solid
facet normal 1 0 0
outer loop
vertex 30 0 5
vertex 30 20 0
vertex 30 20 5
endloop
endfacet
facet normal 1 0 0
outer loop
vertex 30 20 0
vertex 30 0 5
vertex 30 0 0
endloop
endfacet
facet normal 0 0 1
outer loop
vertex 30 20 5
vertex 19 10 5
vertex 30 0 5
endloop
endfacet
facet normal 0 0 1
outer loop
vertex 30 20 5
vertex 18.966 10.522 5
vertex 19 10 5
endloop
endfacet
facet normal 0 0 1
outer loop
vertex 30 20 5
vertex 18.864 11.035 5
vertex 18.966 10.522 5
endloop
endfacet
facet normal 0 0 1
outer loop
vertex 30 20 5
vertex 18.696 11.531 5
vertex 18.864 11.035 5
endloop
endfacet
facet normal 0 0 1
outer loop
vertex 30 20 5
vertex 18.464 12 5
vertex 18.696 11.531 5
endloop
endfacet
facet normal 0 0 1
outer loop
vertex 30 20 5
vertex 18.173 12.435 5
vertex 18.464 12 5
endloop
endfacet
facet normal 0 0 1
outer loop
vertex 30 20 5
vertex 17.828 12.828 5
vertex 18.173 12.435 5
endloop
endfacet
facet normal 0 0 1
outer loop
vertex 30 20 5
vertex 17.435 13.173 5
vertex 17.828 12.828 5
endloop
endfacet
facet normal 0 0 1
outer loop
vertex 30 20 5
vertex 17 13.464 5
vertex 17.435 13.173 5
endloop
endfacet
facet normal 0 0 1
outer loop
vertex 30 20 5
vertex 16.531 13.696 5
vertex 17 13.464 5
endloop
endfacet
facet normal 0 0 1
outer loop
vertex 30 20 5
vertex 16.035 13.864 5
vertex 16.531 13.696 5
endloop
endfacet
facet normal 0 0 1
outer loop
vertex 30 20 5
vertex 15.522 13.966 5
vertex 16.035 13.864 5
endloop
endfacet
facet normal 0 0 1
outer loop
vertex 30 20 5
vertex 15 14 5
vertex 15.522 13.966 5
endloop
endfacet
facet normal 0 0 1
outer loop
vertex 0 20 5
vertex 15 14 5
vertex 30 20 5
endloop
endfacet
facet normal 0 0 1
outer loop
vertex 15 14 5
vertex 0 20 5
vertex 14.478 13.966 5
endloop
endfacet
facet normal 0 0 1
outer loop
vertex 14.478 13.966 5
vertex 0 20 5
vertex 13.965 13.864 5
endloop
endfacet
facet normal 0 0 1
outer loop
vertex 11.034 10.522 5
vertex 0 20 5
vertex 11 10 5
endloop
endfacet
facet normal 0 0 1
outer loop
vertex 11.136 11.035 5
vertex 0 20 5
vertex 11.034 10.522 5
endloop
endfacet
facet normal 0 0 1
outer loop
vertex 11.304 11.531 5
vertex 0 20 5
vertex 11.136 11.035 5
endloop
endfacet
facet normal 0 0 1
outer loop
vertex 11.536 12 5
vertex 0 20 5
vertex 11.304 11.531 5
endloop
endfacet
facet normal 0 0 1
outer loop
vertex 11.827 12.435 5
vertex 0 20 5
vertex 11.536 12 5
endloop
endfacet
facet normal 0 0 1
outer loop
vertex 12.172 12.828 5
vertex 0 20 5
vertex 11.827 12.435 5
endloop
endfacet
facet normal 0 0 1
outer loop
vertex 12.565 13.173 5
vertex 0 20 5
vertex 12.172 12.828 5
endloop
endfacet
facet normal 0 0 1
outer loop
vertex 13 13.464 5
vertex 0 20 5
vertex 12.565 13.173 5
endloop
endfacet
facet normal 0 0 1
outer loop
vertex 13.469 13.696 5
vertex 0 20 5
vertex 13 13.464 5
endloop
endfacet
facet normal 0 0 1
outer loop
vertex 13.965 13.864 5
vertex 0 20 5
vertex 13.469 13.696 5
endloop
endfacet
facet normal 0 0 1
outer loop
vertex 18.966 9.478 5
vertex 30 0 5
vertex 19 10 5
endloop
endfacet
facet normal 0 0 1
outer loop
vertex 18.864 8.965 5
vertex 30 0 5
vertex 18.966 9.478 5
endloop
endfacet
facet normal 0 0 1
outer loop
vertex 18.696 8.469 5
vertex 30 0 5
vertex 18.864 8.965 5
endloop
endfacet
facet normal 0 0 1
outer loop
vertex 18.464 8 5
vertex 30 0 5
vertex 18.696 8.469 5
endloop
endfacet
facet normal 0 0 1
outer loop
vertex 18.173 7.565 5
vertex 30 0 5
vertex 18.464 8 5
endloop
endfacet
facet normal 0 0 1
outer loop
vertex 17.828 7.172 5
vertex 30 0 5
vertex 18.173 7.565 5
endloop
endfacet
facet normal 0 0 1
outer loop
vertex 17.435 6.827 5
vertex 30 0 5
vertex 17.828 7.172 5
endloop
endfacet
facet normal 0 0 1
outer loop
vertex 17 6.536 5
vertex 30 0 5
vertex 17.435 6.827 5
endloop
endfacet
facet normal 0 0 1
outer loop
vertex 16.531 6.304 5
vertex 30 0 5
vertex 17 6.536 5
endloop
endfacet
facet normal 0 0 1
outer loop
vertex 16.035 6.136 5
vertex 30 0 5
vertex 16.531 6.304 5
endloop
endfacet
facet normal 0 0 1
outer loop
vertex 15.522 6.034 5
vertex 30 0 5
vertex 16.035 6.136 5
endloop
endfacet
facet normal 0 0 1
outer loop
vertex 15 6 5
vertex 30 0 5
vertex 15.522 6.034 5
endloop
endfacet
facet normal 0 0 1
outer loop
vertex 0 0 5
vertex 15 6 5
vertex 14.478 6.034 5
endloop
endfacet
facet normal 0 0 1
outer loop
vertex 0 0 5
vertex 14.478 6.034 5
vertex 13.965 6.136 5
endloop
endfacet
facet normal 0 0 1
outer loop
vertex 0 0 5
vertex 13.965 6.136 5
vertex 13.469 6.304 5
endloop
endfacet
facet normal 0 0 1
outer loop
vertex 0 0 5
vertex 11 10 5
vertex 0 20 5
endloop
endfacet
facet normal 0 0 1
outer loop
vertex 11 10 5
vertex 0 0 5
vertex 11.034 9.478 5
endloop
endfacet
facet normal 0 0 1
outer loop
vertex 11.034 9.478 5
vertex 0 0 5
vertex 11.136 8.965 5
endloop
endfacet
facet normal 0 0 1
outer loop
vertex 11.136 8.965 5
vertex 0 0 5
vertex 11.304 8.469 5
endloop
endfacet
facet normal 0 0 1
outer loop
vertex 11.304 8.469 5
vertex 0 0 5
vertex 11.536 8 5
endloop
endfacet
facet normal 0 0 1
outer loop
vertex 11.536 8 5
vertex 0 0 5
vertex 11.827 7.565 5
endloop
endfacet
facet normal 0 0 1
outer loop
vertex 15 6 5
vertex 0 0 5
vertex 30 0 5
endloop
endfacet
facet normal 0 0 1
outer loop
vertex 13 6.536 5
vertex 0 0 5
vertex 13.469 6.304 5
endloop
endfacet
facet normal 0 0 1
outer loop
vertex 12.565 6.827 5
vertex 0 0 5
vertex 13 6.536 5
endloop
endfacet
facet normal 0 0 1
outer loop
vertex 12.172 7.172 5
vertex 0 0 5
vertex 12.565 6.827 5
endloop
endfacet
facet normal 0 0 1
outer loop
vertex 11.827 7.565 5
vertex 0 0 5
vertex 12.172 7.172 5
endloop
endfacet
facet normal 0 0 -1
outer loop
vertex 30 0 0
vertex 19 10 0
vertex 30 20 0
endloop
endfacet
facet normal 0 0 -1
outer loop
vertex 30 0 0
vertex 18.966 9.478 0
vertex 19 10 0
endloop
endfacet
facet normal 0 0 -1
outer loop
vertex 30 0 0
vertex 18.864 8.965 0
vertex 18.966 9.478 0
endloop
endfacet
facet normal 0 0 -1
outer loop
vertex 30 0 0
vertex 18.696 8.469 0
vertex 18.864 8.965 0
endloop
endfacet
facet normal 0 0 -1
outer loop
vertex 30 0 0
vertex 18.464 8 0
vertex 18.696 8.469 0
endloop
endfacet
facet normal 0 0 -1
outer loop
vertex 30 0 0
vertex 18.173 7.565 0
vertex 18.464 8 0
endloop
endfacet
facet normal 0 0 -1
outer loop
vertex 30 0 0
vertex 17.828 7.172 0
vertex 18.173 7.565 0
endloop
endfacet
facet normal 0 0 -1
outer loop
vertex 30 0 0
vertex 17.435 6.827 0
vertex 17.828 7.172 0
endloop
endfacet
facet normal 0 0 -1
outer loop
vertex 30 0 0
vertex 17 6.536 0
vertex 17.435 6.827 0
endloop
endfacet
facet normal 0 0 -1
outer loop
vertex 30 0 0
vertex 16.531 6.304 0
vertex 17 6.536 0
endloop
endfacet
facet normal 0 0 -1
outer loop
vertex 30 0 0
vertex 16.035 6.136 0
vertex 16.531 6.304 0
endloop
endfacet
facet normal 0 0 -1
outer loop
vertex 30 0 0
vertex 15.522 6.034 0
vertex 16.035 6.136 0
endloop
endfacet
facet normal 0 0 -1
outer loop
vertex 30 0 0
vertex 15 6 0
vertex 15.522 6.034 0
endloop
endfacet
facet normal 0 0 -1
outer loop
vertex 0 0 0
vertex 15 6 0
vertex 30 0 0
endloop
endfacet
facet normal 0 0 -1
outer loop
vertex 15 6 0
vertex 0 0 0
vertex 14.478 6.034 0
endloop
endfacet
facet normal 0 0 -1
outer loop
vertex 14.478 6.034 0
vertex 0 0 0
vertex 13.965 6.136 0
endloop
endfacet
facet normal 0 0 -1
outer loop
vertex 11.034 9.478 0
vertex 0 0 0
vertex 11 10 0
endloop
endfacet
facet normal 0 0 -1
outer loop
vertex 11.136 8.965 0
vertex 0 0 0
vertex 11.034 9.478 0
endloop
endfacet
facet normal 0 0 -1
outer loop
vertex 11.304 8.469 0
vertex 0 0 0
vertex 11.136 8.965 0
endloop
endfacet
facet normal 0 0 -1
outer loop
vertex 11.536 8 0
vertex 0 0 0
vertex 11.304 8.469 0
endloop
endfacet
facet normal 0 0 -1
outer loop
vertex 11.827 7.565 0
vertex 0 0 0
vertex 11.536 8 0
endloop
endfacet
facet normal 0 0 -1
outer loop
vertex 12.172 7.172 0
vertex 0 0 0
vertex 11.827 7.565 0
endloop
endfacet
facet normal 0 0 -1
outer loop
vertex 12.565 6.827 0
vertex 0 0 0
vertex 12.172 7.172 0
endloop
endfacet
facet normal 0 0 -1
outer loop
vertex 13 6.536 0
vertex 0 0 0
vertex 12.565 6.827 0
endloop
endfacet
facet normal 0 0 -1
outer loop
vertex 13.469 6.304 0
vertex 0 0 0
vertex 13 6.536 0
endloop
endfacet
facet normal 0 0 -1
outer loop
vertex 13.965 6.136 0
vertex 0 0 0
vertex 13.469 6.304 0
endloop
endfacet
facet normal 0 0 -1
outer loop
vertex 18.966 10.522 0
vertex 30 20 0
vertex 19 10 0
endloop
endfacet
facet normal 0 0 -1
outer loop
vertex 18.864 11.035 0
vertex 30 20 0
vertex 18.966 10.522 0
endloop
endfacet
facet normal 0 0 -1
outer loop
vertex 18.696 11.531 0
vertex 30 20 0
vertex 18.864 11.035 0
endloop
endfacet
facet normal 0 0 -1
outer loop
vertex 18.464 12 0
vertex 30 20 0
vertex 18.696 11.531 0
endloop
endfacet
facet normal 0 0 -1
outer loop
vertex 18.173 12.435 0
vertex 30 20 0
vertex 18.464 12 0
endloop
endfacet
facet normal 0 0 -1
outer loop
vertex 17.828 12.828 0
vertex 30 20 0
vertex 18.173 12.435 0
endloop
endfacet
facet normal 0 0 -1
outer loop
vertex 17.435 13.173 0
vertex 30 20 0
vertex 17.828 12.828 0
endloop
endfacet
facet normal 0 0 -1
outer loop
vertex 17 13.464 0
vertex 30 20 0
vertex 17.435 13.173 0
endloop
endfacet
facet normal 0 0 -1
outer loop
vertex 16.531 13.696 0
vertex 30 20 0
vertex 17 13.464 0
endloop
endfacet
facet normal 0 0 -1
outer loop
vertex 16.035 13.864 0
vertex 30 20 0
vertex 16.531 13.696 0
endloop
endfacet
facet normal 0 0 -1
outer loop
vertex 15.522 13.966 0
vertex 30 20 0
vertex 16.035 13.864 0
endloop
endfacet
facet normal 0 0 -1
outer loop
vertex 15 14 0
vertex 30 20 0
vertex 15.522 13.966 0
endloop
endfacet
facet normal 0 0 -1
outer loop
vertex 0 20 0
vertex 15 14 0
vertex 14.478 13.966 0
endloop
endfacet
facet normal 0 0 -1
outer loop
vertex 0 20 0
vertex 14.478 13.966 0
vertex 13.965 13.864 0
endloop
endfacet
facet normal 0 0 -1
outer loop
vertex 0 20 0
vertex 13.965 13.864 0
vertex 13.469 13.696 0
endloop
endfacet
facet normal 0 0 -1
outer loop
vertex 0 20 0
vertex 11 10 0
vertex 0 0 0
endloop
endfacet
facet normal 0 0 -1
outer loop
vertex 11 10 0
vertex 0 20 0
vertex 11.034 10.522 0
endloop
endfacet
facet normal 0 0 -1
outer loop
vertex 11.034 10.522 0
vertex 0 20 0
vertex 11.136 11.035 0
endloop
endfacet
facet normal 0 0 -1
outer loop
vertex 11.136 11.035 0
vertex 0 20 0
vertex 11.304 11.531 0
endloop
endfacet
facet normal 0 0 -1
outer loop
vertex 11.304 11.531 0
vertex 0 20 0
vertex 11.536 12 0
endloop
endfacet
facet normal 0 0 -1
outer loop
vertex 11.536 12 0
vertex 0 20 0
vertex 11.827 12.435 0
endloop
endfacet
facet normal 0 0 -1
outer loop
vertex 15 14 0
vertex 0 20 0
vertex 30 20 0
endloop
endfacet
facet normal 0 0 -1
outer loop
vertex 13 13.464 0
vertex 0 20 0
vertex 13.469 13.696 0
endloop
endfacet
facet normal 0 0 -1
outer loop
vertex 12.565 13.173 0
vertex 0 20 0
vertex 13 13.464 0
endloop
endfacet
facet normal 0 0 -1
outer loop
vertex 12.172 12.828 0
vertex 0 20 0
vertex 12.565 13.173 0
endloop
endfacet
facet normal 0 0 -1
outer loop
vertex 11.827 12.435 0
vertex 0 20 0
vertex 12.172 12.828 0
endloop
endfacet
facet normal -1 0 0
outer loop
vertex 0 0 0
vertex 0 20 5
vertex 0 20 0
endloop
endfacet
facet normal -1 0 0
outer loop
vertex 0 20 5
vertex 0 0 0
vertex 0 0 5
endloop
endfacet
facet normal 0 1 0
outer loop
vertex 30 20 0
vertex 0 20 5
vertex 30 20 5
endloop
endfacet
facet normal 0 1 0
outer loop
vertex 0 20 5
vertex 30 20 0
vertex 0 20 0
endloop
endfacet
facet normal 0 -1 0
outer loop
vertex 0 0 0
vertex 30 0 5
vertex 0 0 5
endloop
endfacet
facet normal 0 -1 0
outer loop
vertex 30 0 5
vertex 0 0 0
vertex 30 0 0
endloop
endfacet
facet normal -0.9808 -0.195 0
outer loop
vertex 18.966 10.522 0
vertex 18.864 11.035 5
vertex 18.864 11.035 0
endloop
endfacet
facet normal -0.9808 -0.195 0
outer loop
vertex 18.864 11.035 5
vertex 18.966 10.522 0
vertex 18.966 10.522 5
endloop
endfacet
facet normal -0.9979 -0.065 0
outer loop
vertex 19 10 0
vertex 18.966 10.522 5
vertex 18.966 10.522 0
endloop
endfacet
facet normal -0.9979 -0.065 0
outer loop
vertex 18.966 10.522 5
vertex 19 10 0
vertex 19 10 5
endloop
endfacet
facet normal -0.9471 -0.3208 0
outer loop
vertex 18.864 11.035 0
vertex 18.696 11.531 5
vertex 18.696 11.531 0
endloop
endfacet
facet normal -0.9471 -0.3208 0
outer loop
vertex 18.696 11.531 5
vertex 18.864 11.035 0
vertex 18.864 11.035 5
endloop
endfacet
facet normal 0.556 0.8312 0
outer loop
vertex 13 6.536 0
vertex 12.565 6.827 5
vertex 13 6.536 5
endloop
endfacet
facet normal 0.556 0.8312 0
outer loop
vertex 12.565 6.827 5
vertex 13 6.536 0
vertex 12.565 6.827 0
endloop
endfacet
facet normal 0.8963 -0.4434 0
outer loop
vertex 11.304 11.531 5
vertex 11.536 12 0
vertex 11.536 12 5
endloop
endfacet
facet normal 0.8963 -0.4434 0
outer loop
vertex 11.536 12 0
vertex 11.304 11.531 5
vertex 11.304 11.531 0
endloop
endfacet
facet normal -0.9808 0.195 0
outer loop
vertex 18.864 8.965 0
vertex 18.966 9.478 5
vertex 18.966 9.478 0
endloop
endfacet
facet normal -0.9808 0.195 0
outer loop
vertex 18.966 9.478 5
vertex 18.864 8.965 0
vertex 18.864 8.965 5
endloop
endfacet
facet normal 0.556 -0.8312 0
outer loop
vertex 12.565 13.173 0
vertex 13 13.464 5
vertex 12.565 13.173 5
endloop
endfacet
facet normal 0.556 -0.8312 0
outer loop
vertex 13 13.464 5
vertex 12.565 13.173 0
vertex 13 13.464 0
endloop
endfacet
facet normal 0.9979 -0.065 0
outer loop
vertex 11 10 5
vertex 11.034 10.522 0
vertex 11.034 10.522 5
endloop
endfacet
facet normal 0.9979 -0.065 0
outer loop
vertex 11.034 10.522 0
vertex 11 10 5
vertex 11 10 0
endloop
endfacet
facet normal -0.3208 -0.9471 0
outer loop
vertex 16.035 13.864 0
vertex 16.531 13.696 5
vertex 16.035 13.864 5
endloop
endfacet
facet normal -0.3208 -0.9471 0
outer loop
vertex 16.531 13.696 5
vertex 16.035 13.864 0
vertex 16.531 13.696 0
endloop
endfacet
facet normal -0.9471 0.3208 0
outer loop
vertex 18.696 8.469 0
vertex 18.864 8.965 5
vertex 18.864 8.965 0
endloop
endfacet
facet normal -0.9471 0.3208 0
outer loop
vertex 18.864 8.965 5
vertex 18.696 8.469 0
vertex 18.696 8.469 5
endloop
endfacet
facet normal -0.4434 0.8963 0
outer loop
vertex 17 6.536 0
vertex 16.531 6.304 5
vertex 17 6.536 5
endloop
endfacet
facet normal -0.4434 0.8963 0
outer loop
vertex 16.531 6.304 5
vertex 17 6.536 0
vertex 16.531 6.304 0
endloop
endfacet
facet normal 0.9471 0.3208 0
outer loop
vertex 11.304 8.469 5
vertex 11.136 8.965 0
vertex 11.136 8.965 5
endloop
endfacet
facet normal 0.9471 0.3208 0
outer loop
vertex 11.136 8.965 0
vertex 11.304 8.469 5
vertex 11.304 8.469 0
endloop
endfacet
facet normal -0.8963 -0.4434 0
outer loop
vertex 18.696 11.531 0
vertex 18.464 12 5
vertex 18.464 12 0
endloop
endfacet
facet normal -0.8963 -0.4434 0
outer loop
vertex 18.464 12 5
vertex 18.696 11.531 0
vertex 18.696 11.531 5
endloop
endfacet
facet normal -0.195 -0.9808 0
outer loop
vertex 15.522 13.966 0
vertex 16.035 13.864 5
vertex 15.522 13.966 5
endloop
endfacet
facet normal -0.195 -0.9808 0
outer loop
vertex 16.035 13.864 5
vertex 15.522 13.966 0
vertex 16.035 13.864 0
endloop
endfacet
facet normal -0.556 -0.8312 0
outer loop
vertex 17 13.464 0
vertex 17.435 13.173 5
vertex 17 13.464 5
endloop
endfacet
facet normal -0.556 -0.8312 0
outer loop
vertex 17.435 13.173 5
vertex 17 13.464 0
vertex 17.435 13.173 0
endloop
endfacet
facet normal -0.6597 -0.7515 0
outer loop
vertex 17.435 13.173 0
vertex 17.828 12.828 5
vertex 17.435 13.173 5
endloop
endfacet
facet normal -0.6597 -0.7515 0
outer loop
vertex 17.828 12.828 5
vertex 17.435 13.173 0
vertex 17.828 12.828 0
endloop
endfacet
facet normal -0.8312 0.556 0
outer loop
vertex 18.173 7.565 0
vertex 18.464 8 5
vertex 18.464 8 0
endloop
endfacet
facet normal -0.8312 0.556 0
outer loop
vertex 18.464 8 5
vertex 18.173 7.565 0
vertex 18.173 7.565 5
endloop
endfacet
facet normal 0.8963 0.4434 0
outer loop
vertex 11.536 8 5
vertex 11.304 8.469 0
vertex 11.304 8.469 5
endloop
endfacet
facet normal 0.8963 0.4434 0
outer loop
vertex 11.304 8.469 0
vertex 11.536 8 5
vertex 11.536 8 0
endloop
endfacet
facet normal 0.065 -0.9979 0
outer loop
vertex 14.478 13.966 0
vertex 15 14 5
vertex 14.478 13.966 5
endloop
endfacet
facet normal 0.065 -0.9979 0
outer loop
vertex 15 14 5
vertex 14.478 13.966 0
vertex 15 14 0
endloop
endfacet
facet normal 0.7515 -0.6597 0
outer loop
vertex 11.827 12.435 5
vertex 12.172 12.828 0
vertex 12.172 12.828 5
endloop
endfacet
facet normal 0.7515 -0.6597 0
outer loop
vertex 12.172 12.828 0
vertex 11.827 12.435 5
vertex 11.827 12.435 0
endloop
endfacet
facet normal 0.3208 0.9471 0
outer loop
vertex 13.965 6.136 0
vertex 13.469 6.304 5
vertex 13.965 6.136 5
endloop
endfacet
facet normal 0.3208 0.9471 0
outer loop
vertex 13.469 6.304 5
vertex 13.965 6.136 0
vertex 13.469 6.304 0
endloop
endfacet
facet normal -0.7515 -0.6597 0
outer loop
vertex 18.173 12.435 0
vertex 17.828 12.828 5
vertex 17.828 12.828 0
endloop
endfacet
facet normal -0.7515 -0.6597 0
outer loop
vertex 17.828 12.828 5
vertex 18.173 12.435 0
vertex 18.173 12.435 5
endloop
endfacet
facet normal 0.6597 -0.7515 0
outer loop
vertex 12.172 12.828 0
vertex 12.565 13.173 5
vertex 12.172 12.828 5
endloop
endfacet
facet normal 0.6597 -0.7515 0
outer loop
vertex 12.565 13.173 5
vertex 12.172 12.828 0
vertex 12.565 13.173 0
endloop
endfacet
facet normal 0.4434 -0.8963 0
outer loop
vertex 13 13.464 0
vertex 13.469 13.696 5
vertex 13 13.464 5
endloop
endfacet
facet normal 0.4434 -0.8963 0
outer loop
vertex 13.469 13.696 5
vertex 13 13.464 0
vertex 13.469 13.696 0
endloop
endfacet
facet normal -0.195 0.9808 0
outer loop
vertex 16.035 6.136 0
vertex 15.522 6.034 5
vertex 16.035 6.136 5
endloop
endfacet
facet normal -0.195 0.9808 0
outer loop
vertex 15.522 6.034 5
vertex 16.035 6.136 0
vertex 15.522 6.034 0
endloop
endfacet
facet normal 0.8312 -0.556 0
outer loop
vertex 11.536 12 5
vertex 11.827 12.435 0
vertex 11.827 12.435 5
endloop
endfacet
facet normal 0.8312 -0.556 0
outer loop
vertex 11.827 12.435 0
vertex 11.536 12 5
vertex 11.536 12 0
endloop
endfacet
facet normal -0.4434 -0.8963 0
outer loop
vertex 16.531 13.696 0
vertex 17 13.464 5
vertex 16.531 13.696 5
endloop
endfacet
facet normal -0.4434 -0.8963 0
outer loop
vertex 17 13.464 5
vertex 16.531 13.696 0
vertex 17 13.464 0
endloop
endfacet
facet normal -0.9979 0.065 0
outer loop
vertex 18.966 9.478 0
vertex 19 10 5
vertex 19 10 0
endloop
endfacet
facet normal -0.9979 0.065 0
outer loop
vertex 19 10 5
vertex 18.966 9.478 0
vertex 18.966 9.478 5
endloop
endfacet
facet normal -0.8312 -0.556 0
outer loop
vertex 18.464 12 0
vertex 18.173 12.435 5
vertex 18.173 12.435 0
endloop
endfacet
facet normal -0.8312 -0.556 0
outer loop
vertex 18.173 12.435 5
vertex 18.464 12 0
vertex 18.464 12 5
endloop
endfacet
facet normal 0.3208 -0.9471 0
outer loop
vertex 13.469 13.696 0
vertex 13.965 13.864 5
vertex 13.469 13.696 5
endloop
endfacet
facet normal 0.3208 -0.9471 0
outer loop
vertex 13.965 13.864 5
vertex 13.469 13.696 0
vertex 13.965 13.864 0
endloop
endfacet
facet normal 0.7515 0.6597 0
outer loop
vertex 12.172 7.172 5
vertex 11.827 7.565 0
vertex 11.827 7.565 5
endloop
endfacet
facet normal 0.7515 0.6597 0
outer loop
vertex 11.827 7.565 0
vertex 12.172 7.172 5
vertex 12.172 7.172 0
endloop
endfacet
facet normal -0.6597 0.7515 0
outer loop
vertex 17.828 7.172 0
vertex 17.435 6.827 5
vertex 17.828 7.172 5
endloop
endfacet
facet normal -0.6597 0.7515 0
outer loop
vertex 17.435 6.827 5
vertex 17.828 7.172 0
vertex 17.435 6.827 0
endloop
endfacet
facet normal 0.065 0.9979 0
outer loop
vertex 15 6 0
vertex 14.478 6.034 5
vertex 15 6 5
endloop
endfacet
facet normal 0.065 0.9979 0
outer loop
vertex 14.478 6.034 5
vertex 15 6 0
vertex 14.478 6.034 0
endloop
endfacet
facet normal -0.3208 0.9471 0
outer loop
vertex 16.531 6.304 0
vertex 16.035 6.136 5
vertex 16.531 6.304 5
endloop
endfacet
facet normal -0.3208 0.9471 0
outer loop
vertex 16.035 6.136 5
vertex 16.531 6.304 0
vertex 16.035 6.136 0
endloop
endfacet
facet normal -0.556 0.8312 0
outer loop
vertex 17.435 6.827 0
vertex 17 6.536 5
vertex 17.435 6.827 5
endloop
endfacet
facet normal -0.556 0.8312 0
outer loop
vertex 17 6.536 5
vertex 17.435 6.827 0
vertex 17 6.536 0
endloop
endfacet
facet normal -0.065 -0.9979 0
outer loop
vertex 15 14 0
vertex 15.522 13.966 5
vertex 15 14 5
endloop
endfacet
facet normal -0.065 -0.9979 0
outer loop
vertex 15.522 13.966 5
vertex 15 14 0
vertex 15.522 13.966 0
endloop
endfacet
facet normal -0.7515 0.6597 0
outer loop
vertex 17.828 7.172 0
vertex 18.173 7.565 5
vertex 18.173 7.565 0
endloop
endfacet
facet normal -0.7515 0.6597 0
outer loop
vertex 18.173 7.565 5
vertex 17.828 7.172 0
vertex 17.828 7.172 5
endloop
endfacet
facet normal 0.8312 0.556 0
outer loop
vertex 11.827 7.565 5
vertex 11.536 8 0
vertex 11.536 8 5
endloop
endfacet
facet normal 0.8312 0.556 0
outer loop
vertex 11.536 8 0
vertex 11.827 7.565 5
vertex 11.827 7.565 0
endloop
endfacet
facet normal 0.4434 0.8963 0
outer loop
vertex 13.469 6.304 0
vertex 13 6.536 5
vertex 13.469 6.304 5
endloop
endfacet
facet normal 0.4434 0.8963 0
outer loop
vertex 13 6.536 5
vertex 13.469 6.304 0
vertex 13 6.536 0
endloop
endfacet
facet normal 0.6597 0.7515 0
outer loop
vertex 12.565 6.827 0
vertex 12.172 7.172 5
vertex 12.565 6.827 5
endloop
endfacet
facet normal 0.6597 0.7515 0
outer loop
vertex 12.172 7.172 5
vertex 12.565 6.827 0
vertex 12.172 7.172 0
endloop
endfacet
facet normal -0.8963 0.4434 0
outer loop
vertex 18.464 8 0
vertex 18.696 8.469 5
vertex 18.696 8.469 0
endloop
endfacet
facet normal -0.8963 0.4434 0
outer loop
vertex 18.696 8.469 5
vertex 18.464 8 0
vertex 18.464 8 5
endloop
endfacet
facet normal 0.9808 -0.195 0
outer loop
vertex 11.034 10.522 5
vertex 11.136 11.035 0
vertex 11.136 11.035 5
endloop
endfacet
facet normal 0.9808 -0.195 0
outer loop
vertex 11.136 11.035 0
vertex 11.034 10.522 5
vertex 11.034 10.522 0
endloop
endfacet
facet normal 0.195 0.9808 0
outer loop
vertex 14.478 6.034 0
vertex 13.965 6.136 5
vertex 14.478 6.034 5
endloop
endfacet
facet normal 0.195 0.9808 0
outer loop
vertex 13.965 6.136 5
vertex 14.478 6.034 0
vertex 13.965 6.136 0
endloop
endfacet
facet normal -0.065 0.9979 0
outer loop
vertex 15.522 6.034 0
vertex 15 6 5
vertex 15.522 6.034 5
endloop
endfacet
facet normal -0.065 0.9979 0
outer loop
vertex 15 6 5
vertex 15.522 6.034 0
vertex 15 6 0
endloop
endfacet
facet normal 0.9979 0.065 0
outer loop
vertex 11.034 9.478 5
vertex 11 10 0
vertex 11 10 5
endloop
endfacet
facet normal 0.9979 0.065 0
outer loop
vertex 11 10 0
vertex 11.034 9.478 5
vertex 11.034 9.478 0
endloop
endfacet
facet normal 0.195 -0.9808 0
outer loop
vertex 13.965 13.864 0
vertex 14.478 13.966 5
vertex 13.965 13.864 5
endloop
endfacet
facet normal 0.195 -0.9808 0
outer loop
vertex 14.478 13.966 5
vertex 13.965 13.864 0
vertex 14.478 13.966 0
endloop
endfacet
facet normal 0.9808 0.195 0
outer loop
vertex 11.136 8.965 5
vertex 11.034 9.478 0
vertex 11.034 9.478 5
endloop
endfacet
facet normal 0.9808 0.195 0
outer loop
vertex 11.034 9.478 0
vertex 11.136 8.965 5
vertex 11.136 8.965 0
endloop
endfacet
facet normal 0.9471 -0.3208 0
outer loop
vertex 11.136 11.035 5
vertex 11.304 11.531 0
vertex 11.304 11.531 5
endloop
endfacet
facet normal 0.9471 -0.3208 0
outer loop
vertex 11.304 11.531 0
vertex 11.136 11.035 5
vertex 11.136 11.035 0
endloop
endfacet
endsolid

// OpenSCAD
// A plate with a round hole and three callout anchors (see the help card scad/anchors)
difference() {
    cube([30, 20, 5]);
    translate([15, 10, -1]) cylinder(h = 7, r = 4, $fn = 48);
}

echo("anchor", "corner", [0, 0, 5]);

translate([15, 10, 5]) {
    echo("anchor", "hole-center", [0, 0, 0]);
    rotate([0, 0, 45]) {
        echo("anchor", "hole-edge", [4, 0, 0]);
    }
}
